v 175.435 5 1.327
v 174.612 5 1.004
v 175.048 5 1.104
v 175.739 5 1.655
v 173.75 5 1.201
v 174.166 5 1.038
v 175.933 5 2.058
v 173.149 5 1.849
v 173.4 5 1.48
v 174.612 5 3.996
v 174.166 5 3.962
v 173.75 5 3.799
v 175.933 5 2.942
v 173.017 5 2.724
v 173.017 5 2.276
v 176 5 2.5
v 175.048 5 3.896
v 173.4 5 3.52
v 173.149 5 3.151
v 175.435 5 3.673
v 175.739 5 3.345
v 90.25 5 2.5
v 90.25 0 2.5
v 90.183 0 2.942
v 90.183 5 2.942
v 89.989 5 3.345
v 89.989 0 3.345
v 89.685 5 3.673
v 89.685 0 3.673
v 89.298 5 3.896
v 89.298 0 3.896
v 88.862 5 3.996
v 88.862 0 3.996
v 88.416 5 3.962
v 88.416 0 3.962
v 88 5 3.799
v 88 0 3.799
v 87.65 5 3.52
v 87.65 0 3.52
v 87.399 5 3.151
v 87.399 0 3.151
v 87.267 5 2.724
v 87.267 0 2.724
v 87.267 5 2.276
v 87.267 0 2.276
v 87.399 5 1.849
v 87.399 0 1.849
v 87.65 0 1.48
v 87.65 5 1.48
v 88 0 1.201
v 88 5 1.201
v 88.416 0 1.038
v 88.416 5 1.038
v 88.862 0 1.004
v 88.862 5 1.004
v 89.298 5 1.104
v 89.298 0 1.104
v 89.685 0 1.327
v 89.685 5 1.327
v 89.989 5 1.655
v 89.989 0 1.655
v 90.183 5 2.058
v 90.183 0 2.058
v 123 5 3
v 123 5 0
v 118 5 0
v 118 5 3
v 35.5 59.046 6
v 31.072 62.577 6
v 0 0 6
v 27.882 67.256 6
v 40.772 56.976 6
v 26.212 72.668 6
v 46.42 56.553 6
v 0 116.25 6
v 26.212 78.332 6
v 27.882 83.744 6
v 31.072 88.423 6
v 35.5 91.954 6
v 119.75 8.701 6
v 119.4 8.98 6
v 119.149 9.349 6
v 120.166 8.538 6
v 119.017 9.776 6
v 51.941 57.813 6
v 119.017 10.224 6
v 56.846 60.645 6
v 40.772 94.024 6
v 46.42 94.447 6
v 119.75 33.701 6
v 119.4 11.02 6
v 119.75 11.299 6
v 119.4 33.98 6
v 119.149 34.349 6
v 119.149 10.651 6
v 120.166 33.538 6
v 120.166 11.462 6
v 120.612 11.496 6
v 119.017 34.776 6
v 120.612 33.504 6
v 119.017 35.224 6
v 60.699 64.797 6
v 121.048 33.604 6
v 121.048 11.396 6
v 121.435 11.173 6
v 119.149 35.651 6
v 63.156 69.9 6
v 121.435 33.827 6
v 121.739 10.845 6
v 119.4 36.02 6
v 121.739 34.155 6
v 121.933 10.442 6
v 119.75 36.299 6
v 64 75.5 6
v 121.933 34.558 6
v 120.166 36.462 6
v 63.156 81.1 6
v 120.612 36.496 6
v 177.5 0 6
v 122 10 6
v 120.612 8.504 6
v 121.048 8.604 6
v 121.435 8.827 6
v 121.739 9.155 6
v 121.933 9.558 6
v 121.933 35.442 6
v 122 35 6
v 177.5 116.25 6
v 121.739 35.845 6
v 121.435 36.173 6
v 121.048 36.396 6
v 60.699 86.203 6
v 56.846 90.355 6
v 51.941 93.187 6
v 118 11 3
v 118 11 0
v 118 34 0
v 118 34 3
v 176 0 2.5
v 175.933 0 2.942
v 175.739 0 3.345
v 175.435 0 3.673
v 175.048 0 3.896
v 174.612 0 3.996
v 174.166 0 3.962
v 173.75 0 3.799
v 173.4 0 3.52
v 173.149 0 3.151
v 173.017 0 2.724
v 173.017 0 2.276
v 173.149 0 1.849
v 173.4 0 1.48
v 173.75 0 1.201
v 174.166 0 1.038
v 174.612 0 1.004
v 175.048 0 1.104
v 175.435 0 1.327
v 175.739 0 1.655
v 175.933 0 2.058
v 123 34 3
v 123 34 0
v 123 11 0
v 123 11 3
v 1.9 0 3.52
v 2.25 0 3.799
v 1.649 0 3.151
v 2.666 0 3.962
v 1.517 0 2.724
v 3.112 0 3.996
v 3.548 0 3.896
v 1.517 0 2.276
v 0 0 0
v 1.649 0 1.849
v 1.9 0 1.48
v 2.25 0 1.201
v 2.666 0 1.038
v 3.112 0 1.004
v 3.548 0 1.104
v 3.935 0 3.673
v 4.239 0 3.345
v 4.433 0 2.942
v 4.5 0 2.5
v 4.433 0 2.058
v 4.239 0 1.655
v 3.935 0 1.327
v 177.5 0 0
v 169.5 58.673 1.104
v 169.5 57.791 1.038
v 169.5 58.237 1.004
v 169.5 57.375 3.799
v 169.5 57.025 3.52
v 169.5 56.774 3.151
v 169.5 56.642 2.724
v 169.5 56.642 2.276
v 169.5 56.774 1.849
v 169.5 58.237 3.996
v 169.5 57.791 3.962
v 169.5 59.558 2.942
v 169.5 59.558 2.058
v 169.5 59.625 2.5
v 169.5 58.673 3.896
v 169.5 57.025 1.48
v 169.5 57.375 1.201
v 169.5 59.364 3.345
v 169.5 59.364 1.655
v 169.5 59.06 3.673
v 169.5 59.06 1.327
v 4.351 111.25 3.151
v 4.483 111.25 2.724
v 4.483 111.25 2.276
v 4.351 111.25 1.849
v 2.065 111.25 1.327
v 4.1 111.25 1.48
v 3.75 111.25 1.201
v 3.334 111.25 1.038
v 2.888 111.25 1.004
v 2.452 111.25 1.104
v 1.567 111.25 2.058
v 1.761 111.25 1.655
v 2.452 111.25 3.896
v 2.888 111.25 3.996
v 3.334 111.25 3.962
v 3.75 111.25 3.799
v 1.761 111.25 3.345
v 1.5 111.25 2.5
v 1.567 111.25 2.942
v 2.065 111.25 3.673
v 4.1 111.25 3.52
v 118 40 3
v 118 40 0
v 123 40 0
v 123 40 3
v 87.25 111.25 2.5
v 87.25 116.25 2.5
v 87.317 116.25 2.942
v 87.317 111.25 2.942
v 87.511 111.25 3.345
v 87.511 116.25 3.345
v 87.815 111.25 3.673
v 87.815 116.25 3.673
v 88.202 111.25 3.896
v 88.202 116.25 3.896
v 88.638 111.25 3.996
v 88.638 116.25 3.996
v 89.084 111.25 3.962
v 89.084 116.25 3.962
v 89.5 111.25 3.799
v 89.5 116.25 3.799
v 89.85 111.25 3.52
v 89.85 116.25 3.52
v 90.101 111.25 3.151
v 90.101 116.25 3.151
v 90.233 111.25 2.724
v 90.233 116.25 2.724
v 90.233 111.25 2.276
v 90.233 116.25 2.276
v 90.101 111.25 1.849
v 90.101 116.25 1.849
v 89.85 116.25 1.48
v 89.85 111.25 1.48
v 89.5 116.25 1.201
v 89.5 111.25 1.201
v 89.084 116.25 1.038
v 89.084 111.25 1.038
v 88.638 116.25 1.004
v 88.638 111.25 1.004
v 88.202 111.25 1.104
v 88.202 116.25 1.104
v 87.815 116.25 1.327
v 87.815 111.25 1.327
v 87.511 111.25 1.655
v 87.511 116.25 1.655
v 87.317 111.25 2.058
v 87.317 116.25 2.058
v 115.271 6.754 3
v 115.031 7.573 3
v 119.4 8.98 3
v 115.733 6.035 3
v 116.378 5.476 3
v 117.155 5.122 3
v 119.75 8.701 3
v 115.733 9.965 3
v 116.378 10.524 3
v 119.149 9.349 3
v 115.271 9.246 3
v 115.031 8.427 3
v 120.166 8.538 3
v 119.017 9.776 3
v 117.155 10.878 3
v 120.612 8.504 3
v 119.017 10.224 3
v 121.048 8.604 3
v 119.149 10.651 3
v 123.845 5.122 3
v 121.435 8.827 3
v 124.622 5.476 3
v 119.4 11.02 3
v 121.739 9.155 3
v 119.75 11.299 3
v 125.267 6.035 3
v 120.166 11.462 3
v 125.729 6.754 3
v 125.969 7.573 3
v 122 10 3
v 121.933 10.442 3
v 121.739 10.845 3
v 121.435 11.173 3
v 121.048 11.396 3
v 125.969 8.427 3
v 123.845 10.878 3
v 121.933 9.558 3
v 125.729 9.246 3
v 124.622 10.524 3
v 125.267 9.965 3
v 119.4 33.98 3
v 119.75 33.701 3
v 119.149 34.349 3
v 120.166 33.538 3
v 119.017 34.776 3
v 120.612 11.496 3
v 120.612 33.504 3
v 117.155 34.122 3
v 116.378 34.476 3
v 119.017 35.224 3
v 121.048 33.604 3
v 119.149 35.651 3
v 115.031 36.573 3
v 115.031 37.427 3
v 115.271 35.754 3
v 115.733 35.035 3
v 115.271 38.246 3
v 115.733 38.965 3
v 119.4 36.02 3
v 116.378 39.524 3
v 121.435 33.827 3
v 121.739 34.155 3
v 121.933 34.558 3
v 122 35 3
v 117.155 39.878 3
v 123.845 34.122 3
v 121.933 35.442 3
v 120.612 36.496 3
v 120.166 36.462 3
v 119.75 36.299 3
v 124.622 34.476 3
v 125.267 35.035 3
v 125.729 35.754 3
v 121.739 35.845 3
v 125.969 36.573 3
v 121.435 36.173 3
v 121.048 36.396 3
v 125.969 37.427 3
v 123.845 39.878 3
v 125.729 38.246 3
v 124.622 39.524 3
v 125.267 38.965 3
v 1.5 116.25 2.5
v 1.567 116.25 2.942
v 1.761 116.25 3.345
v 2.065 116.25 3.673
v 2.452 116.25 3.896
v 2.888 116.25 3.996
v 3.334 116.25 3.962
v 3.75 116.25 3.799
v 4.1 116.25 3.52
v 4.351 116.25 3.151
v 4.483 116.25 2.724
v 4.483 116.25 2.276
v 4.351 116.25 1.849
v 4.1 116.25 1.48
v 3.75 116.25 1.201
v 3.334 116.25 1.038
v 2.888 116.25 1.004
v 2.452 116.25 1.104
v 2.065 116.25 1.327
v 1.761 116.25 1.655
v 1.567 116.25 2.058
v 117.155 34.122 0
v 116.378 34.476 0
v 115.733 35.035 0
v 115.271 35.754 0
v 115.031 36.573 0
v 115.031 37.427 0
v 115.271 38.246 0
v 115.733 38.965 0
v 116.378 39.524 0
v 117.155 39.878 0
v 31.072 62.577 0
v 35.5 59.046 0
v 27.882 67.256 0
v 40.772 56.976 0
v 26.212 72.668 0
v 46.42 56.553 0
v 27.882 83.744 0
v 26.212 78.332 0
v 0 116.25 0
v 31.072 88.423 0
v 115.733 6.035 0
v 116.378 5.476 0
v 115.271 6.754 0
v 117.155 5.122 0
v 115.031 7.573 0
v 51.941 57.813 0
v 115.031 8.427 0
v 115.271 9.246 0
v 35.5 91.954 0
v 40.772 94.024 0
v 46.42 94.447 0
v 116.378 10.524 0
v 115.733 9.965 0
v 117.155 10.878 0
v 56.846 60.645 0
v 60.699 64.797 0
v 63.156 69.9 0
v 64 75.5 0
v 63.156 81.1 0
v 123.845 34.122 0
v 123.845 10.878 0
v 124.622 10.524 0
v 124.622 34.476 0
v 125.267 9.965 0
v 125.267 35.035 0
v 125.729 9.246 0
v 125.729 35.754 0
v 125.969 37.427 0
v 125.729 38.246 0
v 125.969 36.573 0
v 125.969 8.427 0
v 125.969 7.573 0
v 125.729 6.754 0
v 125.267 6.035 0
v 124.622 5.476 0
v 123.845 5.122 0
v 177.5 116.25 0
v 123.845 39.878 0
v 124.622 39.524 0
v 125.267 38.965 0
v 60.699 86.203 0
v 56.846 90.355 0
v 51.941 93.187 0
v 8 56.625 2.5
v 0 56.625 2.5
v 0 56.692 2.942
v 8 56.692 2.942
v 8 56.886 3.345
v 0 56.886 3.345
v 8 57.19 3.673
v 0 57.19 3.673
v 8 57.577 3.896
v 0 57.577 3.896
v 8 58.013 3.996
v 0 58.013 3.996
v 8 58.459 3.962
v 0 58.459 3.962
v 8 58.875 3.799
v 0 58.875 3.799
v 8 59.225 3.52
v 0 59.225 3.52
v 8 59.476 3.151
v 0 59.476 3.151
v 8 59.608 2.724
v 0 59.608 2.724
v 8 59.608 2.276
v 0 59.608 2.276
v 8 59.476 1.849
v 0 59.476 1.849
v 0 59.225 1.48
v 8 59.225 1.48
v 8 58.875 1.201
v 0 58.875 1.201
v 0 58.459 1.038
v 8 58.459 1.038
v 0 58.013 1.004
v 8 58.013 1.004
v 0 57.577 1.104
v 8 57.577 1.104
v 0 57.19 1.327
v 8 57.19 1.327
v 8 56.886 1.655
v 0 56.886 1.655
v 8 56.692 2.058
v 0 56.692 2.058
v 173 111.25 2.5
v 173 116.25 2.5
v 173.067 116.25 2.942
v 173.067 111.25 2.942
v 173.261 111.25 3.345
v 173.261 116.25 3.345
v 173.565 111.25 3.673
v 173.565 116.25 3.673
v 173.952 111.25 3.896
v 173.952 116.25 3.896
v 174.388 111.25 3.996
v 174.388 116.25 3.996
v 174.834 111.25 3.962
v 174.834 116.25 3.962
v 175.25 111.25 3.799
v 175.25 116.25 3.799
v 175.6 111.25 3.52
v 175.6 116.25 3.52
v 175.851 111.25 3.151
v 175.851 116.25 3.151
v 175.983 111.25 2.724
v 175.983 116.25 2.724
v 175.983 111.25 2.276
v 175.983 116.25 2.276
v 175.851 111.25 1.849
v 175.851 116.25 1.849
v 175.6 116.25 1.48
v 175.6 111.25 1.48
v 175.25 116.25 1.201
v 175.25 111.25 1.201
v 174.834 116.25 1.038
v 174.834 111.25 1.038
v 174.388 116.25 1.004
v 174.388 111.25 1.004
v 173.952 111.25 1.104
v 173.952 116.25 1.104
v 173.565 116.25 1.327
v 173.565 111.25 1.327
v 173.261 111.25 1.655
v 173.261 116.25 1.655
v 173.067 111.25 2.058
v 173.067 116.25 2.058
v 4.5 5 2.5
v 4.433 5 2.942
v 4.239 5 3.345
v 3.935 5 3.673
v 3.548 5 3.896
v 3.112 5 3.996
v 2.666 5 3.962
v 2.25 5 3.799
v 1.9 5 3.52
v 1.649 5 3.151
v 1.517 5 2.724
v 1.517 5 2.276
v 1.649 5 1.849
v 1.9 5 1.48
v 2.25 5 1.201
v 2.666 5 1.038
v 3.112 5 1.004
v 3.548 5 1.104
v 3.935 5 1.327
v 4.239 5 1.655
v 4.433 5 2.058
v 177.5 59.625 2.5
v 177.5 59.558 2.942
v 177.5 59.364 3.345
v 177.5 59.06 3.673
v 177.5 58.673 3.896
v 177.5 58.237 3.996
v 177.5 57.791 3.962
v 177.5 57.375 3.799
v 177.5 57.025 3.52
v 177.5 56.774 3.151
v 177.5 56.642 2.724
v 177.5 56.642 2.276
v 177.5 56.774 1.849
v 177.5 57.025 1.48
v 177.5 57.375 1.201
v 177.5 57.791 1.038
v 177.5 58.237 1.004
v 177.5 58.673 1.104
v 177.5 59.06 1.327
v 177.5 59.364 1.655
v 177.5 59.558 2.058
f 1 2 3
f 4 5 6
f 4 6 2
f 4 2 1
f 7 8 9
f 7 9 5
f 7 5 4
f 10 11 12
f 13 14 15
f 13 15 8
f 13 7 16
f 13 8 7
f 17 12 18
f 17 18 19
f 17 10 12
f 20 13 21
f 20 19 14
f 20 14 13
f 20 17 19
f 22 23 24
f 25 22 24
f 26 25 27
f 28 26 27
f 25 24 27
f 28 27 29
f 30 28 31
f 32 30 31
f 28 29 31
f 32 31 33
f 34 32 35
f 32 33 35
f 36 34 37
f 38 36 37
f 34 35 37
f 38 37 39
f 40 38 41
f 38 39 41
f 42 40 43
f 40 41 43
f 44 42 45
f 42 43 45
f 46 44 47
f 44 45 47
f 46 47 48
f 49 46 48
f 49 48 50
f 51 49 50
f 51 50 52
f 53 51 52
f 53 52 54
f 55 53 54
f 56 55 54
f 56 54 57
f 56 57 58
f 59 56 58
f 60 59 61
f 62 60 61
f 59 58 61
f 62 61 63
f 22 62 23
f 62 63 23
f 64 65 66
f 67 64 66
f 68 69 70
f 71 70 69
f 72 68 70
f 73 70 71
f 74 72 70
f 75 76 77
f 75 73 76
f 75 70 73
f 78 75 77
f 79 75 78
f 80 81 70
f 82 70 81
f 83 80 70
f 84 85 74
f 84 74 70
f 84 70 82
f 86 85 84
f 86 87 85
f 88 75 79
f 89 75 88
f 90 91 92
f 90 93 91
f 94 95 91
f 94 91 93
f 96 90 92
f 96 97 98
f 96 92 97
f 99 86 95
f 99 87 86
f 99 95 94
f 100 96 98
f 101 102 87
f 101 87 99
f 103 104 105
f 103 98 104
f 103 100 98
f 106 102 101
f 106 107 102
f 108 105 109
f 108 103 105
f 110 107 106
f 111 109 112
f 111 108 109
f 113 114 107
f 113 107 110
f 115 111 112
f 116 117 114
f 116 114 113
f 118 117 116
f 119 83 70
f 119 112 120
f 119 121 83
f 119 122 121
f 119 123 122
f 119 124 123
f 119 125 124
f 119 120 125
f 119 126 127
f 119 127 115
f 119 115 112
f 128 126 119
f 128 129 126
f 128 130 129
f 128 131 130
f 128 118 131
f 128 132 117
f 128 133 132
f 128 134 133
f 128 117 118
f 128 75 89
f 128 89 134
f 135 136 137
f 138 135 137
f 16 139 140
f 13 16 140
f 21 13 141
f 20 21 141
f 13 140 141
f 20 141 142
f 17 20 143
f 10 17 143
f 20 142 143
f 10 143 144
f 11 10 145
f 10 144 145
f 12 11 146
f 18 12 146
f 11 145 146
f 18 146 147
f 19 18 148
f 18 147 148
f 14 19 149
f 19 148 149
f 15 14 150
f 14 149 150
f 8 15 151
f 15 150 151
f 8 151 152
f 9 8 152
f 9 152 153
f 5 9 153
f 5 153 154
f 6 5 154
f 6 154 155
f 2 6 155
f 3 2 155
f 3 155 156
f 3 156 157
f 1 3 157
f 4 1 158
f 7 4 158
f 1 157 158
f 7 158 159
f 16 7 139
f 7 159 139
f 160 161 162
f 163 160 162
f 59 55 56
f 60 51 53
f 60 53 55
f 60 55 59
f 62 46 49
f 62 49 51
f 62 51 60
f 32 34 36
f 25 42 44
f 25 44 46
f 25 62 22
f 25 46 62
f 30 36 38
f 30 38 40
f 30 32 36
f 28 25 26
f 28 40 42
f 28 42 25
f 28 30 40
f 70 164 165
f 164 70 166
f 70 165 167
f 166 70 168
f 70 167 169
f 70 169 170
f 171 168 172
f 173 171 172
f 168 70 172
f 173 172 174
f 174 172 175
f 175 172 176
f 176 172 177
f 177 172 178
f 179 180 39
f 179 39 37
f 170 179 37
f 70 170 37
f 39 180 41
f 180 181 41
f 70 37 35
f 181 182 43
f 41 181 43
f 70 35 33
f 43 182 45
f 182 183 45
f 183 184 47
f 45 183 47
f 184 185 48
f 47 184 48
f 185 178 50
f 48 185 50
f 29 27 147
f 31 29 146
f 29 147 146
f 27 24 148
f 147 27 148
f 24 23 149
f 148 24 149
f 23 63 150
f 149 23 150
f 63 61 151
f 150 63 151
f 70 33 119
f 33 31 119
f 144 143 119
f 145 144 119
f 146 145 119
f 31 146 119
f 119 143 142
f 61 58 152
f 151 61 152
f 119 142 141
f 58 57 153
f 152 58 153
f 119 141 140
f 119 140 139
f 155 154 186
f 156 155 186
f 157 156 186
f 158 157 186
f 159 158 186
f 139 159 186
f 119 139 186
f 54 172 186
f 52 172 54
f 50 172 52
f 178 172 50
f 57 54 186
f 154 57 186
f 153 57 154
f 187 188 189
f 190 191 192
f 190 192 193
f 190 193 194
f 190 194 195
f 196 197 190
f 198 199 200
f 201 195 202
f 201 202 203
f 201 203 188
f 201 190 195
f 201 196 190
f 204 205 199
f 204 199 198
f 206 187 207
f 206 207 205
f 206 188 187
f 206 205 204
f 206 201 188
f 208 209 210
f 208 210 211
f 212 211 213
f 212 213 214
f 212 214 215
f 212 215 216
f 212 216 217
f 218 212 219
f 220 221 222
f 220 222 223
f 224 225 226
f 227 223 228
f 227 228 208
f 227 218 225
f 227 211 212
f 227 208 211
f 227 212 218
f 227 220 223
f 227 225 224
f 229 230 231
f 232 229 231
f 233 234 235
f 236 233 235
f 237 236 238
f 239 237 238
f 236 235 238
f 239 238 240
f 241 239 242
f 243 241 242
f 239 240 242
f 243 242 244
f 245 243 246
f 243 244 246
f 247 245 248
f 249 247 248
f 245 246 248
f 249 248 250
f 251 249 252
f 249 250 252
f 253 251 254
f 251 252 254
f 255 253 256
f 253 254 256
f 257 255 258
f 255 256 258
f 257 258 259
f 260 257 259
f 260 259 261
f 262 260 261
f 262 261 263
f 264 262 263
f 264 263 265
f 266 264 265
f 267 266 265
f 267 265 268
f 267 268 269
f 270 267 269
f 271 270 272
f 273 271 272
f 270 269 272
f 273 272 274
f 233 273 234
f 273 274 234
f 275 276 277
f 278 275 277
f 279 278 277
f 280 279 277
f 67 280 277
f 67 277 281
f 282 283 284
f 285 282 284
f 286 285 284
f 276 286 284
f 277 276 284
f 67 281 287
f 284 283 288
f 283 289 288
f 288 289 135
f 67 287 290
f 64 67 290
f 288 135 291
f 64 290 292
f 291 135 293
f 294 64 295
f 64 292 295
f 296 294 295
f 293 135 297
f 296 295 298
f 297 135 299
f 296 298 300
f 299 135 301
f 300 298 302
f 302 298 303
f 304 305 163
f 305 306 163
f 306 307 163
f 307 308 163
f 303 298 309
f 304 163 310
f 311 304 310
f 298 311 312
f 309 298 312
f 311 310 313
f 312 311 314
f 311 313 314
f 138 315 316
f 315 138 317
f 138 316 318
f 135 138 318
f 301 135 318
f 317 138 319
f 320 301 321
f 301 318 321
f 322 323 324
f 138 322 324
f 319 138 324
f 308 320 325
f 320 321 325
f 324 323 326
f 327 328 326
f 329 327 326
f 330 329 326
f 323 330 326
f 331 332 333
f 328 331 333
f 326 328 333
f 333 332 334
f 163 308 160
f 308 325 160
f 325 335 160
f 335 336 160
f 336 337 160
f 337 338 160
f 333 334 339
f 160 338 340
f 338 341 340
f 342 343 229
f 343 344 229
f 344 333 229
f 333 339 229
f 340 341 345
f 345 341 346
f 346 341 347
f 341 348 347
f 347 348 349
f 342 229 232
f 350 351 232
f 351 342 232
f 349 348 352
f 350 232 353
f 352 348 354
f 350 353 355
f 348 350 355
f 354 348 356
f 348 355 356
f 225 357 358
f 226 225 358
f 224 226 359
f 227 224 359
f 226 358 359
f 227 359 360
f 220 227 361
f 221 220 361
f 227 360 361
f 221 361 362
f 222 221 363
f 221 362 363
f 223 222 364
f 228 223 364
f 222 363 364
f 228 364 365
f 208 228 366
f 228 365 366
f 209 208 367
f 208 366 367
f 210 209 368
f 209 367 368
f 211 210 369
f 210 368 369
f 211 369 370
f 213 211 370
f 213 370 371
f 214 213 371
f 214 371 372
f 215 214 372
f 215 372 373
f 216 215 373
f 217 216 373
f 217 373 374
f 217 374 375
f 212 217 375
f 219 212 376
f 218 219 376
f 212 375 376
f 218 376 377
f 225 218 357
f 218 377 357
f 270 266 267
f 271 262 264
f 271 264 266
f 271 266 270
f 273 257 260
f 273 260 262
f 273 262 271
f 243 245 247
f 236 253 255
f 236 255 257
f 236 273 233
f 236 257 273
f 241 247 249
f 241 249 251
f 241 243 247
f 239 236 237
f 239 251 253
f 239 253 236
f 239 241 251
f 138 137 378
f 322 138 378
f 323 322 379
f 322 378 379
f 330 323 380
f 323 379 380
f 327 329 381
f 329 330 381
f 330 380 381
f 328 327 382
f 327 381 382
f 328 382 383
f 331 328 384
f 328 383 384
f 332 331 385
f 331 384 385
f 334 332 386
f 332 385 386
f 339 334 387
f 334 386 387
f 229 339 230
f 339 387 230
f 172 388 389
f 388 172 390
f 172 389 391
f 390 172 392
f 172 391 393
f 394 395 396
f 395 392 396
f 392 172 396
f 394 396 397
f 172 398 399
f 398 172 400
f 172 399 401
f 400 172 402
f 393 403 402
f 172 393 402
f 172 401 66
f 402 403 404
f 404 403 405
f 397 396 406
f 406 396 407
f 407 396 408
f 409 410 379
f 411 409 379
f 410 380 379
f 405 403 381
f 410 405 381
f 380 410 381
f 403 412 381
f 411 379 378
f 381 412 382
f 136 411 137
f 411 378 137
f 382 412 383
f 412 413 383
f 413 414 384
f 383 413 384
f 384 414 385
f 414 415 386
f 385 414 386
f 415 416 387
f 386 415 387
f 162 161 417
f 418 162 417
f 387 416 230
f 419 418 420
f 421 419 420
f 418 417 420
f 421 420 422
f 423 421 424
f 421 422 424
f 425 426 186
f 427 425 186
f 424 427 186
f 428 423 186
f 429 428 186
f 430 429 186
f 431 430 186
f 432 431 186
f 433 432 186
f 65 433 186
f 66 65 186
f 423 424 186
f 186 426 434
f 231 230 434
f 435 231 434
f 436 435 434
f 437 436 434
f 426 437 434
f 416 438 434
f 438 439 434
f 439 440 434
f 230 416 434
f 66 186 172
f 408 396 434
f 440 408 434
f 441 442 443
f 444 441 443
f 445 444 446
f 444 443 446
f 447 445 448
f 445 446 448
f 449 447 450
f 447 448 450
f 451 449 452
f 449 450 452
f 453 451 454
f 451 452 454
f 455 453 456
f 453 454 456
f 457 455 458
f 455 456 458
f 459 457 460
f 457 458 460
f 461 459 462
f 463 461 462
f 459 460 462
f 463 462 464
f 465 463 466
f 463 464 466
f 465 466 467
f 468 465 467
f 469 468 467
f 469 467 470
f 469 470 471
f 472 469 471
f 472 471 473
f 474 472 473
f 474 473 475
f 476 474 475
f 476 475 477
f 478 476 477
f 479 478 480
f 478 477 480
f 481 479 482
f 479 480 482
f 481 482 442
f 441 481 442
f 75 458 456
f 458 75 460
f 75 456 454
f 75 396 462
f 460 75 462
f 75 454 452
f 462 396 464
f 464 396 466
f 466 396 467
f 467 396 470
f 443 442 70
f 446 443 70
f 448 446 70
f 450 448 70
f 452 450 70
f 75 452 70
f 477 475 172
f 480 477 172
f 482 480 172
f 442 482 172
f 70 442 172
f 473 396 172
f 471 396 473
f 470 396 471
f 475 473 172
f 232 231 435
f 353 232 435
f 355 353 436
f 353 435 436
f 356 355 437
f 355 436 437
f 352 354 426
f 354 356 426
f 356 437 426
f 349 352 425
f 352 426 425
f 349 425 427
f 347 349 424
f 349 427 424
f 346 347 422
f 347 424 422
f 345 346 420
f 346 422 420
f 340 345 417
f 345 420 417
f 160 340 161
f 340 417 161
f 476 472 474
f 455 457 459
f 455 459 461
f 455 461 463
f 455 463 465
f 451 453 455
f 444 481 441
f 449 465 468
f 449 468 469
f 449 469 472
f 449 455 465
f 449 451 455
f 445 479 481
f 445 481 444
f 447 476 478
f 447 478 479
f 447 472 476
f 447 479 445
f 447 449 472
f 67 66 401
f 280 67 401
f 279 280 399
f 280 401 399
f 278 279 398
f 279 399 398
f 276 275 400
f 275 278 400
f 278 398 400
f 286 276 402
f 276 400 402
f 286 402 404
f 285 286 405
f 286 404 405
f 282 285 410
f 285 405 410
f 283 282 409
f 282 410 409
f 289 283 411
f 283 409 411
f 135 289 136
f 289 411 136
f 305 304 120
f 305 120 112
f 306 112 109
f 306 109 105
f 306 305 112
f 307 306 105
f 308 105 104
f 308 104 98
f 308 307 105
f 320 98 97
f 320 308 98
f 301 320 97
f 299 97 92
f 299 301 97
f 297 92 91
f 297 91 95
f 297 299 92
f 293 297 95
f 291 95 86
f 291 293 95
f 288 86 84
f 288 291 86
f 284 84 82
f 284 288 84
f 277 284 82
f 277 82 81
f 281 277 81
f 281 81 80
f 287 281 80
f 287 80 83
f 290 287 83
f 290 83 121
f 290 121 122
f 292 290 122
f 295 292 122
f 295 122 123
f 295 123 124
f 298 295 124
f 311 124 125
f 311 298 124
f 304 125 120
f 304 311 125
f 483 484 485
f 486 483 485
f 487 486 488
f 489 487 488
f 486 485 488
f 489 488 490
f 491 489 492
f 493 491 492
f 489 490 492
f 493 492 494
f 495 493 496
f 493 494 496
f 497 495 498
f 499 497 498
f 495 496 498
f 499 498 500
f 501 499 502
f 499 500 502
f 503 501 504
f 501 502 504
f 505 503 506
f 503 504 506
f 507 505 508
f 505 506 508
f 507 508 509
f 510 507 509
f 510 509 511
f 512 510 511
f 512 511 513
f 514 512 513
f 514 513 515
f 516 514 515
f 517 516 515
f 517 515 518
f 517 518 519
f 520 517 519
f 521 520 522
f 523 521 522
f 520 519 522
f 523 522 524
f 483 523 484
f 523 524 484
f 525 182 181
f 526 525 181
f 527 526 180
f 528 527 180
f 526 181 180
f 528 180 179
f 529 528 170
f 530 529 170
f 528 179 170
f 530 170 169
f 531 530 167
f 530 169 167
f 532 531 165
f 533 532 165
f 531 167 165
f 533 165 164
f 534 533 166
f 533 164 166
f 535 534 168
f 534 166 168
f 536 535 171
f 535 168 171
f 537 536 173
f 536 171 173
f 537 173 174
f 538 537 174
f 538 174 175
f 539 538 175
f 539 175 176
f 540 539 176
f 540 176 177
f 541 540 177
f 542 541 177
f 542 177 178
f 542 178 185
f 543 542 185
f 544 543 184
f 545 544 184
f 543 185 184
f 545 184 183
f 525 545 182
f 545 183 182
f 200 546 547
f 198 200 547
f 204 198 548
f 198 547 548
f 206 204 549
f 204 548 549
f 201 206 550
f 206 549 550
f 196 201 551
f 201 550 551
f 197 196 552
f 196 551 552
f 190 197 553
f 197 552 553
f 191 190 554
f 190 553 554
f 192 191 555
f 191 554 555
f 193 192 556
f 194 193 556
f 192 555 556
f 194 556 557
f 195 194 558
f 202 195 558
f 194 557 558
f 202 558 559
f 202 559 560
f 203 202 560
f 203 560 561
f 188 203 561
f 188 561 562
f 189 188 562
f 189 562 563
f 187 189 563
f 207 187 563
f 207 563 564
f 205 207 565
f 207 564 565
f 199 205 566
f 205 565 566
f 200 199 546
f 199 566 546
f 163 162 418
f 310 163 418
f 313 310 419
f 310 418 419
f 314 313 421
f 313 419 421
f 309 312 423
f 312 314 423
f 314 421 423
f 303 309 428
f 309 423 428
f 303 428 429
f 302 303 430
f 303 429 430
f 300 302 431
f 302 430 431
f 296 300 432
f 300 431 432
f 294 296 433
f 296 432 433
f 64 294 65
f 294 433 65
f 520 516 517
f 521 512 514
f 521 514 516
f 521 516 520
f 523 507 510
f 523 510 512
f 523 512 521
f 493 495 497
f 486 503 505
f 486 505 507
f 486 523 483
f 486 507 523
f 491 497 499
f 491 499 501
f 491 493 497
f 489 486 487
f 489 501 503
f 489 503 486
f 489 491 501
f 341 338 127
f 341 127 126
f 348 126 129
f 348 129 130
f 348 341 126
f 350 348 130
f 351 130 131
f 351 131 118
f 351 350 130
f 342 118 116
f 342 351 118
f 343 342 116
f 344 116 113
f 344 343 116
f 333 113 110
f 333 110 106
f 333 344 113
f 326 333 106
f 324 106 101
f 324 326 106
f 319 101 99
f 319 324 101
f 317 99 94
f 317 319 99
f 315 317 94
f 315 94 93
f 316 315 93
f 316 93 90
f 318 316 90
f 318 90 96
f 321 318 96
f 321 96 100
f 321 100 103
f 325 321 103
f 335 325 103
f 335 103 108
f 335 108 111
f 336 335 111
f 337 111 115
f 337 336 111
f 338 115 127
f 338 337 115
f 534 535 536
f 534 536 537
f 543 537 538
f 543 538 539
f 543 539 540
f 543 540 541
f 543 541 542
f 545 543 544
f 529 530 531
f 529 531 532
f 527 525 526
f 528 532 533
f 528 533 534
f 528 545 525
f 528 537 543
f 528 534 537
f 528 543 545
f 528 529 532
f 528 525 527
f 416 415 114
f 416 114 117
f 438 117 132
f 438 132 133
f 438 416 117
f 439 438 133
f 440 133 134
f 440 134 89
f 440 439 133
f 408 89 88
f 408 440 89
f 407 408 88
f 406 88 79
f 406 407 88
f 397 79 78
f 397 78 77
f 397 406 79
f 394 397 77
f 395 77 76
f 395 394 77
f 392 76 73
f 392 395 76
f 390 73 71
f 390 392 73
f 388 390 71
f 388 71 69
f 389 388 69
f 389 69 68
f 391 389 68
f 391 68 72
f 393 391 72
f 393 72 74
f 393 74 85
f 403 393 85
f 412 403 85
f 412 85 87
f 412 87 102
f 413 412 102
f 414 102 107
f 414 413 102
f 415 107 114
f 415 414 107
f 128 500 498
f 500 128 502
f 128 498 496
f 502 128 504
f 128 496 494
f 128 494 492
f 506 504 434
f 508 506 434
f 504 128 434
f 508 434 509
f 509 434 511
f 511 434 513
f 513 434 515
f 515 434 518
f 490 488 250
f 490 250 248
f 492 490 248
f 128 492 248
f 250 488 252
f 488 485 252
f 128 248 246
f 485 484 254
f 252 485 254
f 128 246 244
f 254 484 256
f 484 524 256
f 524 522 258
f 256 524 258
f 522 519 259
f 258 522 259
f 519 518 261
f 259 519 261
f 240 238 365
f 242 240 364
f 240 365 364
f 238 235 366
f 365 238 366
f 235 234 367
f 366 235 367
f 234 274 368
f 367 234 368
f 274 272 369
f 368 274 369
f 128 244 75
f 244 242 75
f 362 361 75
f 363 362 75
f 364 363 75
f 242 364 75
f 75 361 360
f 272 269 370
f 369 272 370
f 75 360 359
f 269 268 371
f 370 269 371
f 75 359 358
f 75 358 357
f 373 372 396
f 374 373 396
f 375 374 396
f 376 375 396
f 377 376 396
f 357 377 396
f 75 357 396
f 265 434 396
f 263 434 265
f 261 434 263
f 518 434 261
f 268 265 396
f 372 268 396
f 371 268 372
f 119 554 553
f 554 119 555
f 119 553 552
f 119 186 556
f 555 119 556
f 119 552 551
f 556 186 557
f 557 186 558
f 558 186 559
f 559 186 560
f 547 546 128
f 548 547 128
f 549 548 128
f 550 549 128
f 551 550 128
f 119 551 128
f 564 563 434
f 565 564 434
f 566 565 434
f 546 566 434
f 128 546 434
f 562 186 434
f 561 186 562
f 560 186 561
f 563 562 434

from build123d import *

# Parameters (mm, degrees)
F0_R      = 19
F1_DEPTH  = 6
F2_START  = 3
F0_R_2    = 1.5
F2_DEPTH  = 3
F3_R      = 1.5
F4_DEPTH  = 8
F5_R      = 1.5
F6_DEPTH  = 8
F7_R      = 1.5
F8_DEPTH  = 5
F9_R      = 1.5
F10_DEPTH = 5


# Not quite as in the source:
# - a feature names something its author has since deleted; it is built from what else it names


with BuildPart() as f1:
    # F0 (on Top) → F1 (new body)
    with BuildSketch(Plane.XY):
        Polygon((0, 116.25), (0, 0), (177.5, 0), (177.5, 5), (177.5, 40), (177.5, 52.125), (177.5, 64.125), (177.5, 116.25), align=None)
        with BuildLine():
            ThreePointArc((123, 40), (126, 37), (123, 34))
            Line((123, 34), (123, 11))
            ThreePointArc((123, 11), (126, 8), (123, 5))
            Line((123, 5), (118, 5))
            ThreePointArc((118, 5), (115, 8), (118, 11))
            Line((118, 11), (118, 34))
            ThreePointArc((118, 34), (115, 37), (118, 40))
            Line((118, 40), (123, 40))
        make_face(mode=Mode.SUBTRACT)
        with Locations((45, 75.5)):
            Circle(F0_R, mode=Mode.SUBTRACT)
    extrude(amount=F1_DEPTH)

    # F0 (on Top) → F2 (join)
    with BuildSketch(Plane.XY.offset(F2_START)):
        with BuildLine():
            Line((123, 11), (123, 34))
            ThreePointArc((123, 34), (126, 37), (123, 40))
            Line((123, 40), (118, 40))
            ThreePointArc((118, 40), (115, 37), (118, 34))
            Line((118, 34), (118, 11))
            ThreePointArc((118, 11), (115, 8), (118, 5))
            Line((118, 5), (123, 5))
            ThreePointArc((123, 5), (126, 8), (123, 11))
        make_face()
        with Locations((120.5, 10)):
            Circle(F0_R_2, mode=Mode.SUBTRACT)
        with Locations((120.5, 35)):
            Circle(F0_R_2, mode=Mode.SUBTRACT)
    extrude(amount=F2_DEPTH)

    # F3 (on face) → F4 (cut)
    with BuildSketch(Plane.YZ.offset(177.5)):
        with Locations((58.125, 2.5)):
            Circle(F3_R)
    extrude(amount=-F4_DEPTH, mode=Mode.SUBTRACT)

    # F5 (on face) → F6 (cut)
    with BuildSketch(Plane(origin=(0, 0, 0), x_dir=(0, -1, 0), z_dir=(-1, 0, 0))):
        with Locations((-58.125, 2.5)):
            Circle(F5_R)
    extrude(amount=-F6_DEPTH, mode=Mode.SUBTRACT)

    # F7 (on face) → F8 (cut)
    with BuildSketch(Plane.XZ):
        with Locations((3, 2.5)):
            Circle(F7_R)
        with Locations((88.75, 2.5)):
            Circle(F7_R)
        with Locations((174.5, 2.5)):
            Circle(F7_R)
    extrude(amount=-F8_DEPTH, mode=Mode.SUBTRACT)

    # F9 (on face) → F10 (cut)
    with BuildSketch(Plane(origin=(0, 116.25, 0), x_dir=(-1, 0, 0), z_dir=(0, 1, 0))):
        with Locations((-3, 2.5)):
            Circle(F9_R)
        with Locations((-88.75, 2.5)):
            Circle(F9_R)
        with Locations((-174.5, 2.5)):
            Circle(F9_R)
    extrude(amount=-F10_DEPTH, mode=Mode.SUBTRACT)


solid = f1.part
